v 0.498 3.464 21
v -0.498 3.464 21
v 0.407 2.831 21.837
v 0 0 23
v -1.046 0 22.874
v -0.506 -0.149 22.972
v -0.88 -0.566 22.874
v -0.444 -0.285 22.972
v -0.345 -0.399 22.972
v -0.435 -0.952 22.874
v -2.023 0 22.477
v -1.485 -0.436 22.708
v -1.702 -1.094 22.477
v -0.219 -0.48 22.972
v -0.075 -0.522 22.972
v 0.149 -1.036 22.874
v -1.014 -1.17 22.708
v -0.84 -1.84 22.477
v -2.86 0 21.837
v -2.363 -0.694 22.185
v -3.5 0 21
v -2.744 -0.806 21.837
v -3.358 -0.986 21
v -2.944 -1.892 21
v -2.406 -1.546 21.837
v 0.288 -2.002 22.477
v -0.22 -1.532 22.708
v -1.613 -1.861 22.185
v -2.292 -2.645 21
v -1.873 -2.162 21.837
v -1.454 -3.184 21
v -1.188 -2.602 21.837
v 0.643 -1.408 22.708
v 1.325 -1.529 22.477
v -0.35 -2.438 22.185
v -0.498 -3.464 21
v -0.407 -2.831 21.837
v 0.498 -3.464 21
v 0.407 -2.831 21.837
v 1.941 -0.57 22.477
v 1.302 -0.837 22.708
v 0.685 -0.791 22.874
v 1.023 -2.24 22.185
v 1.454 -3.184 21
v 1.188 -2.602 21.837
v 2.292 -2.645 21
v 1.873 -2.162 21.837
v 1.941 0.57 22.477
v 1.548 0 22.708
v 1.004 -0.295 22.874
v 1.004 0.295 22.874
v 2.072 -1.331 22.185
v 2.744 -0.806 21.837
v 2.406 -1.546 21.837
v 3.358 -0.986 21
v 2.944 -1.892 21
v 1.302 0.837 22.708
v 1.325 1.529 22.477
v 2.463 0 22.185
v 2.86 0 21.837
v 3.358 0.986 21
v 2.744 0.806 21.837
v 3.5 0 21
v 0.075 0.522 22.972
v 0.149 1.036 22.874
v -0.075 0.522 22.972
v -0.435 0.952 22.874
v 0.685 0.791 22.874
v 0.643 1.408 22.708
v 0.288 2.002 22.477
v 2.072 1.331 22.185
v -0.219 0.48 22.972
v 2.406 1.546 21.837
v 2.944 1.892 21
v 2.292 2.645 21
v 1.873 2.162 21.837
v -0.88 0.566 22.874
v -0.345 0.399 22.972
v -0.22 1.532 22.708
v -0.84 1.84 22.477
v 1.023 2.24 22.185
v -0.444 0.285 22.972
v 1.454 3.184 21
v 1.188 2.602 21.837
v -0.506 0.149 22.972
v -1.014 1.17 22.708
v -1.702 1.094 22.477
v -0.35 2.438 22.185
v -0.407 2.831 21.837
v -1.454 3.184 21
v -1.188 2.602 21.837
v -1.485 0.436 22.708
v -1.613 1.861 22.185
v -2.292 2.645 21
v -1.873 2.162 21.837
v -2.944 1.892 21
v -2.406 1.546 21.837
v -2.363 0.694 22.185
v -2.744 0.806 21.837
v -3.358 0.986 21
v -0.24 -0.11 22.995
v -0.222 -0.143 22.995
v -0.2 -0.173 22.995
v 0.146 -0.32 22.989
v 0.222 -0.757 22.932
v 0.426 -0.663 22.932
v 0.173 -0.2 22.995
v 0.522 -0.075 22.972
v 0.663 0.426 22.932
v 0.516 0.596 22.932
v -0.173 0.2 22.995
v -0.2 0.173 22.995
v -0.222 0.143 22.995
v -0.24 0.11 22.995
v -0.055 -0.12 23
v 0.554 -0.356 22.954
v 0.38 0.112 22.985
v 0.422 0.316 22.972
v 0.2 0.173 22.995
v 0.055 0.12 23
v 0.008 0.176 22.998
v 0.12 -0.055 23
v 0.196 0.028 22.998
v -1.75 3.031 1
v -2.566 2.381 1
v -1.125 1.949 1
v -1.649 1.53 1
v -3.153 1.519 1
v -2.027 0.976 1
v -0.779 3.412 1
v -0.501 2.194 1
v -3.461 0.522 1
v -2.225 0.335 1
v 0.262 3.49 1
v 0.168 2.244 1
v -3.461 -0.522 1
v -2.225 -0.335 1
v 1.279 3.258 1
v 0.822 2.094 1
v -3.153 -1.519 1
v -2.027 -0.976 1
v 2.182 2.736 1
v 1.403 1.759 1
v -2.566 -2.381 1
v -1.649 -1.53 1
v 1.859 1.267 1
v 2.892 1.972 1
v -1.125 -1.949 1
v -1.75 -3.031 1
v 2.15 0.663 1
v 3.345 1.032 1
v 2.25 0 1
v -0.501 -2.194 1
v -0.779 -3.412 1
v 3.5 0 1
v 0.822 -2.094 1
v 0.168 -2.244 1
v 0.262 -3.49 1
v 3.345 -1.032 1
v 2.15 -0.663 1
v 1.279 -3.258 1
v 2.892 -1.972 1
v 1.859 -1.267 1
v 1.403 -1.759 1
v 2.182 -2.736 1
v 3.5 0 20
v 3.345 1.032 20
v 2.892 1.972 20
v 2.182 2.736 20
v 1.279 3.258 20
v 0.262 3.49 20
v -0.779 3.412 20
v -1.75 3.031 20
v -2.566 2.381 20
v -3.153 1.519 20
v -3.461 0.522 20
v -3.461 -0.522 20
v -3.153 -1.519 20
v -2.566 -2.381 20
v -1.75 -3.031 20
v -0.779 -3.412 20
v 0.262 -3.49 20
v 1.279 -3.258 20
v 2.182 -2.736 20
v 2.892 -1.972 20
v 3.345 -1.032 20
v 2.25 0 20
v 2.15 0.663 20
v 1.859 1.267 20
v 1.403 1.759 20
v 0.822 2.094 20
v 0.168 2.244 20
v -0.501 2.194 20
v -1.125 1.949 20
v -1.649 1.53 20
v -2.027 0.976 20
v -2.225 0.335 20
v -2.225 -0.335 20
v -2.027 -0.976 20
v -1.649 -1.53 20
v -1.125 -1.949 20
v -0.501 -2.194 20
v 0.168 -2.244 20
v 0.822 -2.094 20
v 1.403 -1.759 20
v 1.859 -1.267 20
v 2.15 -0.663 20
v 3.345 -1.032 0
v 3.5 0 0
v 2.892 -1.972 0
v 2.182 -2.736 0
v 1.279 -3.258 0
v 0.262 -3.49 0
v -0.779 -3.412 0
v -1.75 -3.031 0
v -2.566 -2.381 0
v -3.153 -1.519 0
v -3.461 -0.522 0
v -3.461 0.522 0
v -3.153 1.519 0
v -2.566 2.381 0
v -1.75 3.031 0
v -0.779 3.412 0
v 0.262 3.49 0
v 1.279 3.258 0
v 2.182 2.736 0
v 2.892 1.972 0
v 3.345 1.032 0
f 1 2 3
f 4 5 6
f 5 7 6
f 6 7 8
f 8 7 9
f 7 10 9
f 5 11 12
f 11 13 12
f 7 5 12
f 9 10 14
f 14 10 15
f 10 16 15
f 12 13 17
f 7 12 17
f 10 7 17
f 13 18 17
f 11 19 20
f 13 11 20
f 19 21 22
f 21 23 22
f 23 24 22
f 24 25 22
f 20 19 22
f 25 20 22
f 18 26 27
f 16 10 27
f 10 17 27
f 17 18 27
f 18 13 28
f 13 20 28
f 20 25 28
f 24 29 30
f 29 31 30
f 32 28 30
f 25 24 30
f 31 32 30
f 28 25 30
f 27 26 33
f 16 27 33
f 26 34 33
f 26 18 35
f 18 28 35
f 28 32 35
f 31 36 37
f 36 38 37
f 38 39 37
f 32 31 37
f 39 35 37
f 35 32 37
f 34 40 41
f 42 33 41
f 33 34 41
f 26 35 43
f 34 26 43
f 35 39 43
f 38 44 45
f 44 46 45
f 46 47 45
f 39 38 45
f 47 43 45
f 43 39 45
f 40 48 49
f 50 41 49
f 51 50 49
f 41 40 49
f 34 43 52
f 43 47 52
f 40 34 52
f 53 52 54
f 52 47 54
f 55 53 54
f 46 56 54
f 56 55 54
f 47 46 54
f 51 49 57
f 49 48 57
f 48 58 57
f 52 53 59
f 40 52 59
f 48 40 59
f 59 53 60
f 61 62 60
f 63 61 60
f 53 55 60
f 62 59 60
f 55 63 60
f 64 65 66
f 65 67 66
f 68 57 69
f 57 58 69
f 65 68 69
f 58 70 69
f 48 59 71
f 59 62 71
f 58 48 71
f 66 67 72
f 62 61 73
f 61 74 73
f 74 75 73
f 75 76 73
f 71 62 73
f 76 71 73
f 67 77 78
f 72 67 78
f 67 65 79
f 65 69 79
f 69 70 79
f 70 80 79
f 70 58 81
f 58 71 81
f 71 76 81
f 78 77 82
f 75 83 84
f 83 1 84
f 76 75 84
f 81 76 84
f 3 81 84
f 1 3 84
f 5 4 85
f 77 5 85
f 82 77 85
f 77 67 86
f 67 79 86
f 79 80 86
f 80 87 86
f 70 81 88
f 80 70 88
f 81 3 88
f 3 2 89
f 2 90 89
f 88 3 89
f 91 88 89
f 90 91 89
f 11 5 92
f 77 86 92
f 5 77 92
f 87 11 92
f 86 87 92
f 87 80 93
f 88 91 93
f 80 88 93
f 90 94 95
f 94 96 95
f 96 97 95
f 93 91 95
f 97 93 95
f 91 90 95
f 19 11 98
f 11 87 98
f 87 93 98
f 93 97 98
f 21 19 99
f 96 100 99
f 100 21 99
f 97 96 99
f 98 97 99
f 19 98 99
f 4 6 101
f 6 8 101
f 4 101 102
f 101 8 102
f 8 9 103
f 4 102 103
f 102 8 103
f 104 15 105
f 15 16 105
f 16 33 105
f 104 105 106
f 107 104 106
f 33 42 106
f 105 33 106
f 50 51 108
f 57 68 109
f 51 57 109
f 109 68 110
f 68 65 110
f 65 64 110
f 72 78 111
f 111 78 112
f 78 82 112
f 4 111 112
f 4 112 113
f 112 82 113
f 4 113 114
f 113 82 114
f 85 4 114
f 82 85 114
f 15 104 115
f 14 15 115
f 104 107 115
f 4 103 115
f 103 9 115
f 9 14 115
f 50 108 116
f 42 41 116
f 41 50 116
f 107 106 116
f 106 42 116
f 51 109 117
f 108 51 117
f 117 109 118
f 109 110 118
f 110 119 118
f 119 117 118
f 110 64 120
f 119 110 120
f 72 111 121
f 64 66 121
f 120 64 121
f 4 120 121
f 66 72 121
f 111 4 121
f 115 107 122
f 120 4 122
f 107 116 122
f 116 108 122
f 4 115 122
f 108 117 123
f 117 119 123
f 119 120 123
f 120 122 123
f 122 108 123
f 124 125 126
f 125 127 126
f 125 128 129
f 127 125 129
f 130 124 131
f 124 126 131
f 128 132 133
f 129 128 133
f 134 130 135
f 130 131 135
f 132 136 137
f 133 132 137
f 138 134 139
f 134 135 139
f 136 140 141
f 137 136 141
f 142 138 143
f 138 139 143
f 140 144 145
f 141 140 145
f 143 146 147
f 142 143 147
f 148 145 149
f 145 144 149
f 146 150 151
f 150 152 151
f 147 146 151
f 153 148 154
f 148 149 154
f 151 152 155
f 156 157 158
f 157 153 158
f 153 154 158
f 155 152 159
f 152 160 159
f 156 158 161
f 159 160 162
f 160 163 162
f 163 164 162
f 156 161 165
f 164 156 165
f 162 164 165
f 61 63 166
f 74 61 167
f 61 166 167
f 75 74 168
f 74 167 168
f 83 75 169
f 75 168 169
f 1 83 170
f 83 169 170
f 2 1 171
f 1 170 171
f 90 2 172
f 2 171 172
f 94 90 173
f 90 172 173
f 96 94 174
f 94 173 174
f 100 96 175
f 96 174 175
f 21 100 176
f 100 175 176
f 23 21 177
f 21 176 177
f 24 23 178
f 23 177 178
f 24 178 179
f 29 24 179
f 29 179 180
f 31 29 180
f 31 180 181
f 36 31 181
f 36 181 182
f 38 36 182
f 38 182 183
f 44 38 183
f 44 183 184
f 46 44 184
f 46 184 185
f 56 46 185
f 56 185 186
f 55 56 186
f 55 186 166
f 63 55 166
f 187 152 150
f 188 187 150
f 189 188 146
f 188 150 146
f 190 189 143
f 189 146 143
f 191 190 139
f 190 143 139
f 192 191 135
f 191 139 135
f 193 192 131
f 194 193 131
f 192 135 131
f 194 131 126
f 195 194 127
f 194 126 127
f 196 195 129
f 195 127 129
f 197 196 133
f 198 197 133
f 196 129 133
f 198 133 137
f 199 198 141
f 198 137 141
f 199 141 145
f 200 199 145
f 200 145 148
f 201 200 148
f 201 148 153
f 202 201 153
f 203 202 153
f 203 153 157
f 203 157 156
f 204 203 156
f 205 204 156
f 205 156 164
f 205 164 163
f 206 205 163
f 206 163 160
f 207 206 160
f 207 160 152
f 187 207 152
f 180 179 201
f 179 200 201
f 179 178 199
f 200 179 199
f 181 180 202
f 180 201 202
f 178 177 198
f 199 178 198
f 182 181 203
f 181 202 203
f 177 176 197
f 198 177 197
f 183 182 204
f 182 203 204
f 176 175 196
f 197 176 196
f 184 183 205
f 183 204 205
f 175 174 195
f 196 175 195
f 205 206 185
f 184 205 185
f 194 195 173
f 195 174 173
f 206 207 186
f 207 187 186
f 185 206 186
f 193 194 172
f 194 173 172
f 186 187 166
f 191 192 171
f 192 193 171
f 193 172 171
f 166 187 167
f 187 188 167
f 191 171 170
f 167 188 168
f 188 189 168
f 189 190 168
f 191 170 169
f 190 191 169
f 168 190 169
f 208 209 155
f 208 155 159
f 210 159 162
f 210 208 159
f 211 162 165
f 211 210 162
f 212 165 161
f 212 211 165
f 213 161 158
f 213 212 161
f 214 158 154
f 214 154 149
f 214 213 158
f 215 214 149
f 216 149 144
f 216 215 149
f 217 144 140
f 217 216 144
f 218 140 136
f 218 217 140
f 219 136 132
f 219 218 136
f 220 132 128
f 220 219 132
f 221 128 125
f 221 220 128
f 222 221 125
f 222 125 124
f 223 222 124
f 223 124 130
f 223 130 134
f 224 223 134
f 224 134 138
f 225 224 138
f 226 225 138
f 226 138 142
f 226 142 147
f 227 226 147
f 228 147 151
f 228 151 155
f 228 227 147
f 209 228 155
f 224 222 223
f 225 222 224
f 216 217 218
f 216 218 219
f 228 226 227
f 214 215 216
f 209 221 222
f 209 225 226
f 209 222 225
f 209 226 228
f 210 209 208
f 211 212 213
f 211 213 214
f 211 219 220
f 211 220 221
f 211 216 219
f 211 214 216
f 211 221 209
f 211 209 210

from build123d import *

# Parameters (mm, degrees)
F0_R     = 2.25
F1_DEPTH = 20
F2_R     = 3.5
F3_DEPTH = 1
F4_R     = 3.5
F5_DEPTH = 1


with BuildPart() as f1:
    # F0 (on Top) → F1 (new body)
    with BuildSketch(Plane.XY):
        Circle(F0_R)
    extrude(amount=F1_DEPTH)

    # F2 (on face) → F3 (join)
    with BuildSketch(Plane(origin=(0, 0, 0), x_dir=(1, 0, 0), z_dir=(0, 0, -1))):
        Circle(F2_R)
    extrude(amount=-F3_DEPTH)

    # F4 (on face) → F5 (join)
    with BuildSketch(Plane.XY.offset(20)):
        Circle(F4_R)
    extrude(amount=F5_DEPTH)

    # F6 (on Front) → F7 (revolve)
    with BuildSketch(Plane.XZ):
        with BuildLine():
            Line((0, 20.991329), (0, 23))
            ThreePointArc((0, 23), (-2.022616, 22.477079), (-3.5, 21))
            Line((-3.5, 21), (0, 20.991329))
        make_face()
    revolve(axis=Axis((0, 0, 11.212396), (0, 0, 1)))


solid = f1.part
